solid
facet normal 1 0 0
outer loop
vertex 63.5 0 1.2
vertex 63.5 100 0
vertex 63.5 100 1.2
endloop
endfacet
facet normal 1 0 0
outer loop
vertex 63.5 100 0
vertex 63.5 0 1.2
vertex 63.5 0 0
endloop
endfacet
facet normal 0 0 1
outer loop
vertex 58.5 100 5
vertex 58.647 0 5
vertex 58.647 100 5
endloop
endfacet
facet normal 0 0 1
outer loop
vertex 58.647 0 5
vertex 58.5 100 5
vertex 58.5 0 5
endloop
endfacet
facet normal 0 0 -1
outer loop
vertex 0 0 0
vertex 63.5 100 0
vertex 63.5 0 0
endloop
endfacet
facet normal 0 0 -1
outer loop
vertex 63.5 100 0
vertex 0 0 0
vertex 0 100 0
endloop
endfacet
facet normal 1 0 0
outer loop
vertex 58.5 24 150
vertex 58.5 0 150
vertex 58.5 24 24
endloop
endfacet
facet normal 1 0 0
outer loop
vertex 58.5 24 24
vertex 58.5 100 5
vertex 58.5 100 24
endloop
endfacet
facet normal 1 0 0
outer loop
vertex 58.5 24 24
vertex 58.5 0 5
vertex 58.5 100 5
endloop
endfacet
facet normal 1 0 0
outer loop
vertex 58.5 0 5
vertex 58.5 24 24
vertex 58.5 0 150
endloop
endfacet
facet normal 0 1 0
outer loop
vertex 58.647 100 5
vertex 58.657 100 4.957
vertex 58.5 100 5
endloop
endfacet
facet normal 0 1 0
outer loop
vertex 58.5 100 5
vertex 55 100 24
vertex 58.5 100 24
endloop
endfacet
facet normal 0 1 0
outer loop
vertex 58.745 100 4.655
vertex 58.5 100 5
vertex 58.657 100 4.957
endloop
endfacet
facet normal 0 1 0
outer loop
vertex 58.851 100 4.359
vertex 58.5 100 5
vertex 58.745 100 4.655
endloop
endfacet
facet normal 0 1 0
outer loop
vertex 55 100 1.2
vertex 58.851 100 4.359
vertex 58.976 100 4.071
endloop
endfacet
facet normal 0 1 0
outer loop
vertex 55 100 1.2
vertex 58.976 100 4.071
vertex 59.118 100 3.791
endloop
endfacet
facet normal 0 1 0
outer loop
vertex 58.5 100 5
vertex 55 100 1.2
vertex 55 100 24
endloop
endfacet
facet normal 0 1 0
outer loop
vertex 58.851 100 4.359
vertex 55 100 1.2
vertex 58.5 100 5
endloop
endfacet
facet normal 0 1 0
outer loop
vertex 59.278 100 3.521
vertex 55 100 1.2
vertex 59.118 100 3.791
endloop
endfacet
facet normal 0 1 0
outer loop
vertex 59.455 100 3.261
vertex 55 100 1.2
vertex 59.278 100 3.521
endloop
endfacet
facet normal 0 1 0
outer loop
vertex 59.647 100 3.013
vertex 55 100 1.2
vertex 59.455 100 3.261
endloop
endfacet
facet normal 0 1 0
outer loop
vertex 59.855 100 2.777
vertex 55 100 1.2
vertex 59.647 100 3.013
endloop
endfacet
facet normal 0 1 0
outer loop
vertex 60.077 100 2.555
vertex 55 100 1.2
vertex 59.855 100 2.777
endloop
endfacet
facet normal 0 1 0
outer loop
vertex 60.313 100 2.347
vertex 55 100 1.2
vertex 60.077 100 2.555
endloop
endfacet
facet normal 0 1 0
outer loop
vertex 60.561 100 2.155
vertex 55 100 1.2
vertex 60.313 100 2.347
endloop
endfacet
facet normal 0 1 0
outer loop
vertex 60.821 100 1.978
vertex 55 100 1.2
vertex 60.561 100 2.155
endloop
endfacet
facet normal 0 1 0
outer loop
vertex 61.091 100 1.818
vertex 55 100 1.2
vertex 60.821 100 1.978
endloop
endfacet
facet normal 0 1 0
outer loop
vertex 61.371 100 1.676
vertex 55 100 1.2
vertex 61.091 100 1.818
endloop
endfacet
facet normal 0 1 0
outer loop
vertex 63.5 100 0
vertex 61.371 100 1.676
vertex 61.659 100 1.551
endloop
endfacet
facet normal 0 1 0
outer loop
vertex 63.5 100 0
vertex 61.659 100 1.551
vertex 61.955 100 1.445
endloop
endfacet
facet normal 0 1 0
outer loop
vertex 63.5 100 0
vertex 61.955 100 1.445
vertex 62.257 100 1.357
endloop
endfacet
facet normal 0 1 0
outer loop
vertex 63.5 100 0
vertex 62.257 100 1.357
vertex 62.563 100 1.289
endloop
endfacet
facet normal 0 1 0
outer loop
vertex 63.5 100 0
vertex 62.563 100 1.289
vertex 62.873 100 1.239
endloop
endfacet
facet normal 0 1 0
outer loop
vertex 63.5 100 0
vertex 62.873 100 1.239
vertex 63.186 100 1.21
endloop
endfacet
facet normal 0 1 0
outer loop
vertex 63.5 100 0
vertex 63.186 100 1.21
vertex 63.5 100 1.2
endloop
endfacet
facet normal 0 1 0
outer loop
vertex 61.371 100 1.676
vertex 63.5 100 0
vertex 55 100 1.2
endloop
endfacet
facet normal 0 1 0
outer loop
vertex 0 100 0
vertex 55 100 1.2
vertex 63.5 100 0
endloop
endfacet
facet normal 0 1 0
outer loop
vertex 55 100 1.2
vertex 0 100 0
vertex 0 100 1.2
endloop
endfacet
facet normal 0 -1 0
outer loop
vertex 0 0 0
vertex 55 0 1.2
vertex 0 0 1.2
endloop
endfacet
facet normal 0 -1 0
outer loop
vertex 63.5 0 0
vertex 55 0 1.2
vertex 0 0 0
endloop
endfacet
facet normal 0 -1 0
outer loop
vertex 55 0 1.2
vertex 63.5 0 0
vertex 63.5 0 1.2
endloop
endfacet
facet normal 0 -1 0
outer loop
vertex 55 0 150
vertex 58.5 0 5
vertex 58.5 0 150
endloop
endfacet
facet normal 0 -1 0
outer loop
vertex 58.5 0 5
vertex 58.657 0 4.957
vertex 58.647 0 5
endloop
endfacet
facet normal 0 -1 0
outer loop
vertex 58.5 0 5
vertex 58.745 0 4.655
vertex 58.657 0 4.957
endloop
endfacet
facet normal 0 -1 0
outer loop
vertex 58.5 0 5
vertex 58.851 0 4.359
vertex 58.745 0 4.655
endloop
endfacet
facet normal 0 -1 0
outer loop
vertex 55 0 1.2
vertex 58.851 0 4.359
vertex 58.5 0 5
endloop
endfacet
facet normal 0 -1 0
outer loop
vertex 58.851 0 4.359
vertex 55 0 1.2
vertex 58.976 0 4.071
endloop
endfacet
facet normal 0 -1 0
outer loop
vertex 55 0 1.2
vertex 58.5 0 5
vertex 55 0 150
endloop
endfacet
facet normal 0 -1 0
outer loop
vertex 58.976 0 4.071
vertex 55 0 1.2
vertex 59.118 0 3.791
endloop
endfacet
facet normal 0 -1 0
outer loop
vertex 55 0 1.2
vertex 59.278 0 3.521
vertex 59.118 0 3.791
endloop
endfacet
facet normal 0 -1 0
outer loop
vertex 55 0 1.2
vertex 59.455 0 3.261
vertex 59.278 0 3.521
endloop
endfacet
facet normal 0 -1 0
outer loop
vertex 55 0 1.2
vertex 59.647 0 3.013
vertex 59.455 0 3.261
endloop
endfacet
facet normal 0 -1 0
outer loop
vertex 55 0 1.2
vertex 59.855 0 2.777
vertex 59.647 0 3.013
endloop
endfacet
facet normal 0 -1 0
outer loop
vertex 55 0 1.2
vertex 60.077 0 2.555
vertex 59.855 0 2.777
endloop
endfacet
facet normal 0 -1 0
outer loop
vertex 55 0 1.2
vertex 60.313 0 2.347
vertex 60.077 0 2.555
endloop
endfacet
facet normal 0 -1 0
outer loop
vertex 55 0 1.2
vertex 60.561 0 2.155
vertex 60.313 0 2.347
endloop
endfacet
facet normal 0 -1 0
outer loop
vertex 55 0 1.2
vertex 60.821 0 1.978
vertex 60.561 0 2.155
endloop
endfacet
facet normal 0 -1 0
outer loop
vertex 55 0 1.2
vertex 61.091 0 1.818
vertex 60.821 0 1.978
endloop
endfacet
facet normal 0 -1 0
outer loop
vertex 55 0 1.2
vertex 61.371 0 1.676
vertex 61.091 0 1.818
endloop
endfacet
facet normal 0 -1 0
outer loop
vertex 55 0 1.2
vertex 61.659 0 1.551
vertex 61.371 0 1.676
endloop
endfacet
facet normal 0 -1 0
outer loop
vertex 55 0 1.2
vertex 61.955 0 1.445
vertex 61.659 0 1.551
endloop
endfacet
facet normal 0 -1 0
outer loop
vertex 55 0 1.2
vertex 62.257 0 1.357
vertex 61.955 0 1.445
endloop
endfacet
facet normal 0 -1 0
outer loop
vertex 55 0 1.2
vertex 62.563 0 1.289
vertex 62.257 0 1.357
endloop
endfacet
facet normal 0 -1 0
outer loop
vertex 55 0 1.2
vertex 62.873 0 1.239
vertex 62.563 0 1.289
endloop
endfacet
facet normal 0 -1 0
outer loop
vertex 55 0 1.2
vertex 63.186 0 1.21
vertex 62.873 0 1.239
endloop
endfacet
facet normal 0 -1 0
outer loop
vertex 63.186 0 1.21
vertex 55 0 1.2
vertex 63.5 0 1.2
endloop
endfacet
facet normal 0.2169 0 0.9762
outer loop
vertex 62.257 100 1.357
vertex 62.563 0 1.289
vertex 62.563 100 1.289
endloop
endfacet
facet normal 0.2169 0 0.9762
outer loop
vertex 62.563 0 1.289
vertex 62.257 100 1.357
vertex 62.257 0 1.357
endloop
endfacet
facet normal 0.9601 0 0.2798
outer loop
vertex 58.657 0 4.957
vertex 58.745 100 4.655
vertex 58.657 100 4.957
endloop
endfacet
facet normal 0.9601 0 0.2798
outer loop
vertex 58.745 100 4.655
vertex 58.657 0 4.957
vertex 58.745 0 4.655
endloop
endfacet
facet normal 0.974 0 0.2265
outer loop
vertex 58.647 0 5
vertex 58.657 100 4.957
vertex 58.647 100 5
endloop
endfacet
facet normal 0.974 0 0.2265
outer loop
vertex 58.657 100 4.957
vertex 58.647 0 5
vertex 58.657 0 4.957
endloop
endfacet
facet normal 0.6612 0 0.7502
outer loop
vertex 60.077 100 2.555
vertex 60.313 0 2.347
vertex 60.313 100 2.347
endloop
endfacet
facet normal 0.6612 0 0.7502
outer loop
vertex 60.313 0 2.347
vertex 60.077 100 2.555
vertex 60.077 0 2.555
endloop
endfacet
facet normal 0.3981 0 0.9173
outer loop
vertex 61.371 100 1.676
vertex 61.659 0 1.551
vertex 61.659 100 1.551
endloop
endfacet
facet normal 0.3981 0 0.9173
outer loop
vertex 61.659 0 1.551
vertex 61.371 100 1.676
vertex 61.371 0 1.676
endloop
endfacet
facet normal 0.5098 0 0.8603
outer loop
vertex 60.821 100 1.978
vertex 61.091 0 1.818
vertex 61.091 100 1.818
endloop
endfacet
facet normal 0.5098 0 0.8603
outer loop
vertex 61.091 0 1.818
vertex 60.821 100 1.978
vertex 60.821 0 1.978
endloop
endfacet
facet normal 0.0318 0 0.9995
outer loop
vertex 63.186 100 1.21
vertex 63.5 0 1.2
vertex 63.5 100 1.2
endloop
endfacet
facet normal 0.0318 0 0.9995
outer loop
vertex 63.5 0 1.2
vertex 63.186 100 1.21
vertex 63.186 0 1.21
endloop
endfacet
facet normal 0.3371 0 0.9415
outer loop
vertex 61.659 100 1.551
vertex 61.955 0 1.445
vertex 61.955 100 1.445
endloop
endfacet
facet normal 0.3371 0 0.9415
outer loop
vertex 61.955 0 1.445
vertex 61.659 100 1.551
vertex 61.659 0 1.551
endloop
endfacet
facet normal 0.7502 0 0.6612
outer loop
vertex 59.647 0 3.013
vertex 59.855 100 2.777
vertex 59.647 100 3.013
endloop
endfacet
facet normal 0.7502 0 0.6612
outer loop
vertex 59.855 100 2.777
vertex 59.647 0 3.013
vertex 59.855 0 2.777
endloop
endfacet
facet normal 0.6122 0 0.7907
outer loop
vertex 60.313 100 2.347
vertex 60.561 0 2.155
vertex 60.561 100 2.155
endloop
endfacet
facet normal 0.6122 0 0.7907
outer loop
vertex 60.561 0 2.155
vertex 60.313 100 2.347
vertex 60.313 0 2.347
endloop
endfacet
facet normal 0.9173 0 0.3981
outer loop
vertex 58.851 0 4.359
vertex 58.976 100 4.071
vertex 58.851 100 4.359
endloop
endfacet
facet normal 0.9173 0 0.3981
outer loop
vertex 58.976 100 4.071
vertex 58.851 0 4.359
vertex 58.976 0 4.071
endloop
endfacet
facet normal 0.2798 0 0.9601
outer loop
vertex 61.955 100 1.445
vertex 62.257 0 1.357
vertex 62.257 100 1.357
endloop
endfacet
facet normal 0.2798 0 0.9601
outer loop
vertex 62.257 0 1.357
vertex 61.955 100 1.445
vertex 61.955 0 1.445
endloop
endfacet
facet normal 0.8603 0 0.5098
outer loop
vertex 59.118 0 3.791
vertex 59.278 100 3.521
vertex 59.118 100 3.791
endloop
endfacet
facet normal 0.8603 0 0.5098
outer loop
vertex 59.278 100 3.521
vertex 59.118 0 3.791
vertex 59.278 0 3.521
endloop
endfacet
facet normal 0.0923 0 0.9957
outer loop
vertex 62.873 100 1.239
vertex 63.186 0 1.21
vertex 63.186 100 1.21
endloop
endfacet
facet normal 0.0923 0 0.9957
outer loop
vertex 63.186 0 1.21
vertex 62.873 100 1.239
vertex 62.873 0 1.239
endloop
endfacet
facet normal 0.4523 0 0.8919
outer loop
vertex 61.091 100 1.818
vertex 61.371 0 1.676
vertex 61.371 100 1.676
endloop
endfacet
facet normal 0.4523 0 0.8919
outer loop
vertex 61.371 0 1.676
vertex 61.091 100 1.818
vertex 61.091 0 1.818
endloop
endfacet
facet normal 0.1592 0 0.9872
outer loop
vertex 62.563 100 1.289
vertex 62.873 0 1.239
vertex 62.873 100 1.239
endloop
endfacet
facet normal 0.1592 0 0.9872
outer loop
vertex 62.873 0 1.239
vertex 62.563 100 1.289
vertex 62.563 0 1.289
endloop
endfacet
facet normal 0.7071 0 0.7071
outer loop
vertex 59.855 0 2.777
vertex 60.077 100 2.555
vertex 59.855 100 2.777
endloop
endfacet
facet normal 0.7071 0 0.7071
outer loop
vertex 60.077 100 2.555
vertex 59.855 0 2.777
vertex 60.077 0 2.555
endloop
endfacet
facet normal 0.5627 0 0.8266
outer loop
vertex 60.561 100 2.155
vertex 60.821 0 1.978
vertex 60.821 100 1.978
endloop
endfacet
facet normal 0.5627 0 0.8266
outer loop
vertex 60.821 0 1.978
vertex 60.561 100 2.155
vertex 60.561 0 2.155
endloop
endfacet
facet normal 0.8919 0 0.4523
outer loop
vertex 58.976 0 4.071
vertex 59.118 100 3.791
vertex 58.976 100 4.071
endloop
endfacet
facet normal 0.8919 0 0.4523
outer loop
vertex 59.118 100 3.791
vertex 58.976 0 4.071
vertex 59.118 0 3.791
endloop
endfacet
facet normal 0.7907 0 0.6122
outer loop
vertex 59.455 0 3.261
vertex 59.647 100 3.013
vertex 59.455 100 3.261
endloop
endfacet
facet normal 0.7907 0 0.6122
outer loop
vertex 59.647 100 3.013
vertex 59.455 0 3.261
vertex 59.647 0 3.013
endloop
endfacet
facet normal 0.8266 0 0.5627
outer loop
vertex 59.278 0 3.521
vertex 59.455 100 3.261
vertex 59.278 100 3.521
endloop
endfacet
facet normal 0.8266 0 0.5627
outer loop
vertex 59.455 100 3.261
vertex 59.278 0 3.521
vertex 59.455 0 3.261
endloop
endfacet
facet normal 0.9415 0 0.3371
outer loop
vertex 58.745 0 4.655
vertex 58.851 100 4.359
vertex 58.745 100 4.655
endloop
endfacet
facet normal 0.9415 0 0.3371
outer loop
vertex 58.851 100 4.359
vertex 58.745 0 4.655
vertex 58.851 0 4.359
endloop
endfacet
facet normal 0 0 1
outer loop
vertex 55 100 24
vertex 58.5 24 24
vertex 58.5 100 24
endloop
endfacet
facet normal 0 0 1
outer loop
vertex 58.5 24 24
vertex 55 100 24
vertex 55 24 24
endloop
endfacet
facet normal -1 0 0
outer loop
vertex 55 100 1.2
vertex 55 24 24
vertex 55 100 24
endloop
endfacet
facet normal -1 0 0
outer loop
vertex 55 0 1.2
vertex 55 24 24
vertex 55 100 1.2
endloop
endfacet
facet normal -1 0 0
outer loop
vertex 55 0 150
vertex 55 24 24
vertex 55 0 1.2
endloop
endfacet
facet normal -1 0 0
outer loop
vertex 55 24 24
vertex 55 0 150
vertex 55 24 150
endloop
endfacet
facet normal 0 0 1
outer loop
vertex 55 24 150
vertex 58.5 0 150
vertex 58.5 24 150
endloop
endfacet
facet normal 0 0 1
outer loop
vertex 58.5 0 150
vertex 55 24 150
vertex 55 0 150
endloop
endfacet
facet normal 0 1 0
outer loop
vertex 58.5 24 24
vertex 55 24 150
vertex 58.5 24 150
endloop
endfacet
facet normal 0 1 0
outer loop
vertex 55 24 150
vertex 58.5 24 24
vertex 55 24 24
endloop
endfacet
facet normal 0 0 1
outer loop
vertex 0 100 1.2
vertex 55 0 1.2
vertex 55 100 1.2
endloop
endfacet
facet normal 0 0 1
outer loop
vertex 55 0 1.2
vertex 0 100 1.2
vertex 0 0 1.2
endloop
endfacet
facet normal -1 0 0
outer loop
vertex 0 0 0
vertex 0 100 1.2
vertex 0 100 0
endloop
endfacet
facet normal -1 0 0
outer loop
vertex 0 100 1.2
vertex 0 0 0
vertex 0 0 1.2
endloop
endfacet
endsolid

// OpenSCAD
footThickness = 1.2;
standThickness = 3.5;

footLength = 55;
frontExtensionLength = 5;
width = 100;
height = 1.5 * width;

fontWeight = 24;

$fn = $preview ? 40 : 100;

cube([footLength, width, footThickness]);

translate([footLength, 0, 0]) {
    cube([standThickness, width, fontWeight]);
    cube([standThickness, fontWeight, height]);
    
    translate([standThickness, 0, 0])
    difference() {
        cube([frontExtensionLength, width, frontExtensionLength]);
        
        translate([frontExtensionLength, 0, frontExtensionLength + footThickness])
        rotate([-90, 0, 0])
        cylinder(width, r = frontExtensionLength);
    }
}
